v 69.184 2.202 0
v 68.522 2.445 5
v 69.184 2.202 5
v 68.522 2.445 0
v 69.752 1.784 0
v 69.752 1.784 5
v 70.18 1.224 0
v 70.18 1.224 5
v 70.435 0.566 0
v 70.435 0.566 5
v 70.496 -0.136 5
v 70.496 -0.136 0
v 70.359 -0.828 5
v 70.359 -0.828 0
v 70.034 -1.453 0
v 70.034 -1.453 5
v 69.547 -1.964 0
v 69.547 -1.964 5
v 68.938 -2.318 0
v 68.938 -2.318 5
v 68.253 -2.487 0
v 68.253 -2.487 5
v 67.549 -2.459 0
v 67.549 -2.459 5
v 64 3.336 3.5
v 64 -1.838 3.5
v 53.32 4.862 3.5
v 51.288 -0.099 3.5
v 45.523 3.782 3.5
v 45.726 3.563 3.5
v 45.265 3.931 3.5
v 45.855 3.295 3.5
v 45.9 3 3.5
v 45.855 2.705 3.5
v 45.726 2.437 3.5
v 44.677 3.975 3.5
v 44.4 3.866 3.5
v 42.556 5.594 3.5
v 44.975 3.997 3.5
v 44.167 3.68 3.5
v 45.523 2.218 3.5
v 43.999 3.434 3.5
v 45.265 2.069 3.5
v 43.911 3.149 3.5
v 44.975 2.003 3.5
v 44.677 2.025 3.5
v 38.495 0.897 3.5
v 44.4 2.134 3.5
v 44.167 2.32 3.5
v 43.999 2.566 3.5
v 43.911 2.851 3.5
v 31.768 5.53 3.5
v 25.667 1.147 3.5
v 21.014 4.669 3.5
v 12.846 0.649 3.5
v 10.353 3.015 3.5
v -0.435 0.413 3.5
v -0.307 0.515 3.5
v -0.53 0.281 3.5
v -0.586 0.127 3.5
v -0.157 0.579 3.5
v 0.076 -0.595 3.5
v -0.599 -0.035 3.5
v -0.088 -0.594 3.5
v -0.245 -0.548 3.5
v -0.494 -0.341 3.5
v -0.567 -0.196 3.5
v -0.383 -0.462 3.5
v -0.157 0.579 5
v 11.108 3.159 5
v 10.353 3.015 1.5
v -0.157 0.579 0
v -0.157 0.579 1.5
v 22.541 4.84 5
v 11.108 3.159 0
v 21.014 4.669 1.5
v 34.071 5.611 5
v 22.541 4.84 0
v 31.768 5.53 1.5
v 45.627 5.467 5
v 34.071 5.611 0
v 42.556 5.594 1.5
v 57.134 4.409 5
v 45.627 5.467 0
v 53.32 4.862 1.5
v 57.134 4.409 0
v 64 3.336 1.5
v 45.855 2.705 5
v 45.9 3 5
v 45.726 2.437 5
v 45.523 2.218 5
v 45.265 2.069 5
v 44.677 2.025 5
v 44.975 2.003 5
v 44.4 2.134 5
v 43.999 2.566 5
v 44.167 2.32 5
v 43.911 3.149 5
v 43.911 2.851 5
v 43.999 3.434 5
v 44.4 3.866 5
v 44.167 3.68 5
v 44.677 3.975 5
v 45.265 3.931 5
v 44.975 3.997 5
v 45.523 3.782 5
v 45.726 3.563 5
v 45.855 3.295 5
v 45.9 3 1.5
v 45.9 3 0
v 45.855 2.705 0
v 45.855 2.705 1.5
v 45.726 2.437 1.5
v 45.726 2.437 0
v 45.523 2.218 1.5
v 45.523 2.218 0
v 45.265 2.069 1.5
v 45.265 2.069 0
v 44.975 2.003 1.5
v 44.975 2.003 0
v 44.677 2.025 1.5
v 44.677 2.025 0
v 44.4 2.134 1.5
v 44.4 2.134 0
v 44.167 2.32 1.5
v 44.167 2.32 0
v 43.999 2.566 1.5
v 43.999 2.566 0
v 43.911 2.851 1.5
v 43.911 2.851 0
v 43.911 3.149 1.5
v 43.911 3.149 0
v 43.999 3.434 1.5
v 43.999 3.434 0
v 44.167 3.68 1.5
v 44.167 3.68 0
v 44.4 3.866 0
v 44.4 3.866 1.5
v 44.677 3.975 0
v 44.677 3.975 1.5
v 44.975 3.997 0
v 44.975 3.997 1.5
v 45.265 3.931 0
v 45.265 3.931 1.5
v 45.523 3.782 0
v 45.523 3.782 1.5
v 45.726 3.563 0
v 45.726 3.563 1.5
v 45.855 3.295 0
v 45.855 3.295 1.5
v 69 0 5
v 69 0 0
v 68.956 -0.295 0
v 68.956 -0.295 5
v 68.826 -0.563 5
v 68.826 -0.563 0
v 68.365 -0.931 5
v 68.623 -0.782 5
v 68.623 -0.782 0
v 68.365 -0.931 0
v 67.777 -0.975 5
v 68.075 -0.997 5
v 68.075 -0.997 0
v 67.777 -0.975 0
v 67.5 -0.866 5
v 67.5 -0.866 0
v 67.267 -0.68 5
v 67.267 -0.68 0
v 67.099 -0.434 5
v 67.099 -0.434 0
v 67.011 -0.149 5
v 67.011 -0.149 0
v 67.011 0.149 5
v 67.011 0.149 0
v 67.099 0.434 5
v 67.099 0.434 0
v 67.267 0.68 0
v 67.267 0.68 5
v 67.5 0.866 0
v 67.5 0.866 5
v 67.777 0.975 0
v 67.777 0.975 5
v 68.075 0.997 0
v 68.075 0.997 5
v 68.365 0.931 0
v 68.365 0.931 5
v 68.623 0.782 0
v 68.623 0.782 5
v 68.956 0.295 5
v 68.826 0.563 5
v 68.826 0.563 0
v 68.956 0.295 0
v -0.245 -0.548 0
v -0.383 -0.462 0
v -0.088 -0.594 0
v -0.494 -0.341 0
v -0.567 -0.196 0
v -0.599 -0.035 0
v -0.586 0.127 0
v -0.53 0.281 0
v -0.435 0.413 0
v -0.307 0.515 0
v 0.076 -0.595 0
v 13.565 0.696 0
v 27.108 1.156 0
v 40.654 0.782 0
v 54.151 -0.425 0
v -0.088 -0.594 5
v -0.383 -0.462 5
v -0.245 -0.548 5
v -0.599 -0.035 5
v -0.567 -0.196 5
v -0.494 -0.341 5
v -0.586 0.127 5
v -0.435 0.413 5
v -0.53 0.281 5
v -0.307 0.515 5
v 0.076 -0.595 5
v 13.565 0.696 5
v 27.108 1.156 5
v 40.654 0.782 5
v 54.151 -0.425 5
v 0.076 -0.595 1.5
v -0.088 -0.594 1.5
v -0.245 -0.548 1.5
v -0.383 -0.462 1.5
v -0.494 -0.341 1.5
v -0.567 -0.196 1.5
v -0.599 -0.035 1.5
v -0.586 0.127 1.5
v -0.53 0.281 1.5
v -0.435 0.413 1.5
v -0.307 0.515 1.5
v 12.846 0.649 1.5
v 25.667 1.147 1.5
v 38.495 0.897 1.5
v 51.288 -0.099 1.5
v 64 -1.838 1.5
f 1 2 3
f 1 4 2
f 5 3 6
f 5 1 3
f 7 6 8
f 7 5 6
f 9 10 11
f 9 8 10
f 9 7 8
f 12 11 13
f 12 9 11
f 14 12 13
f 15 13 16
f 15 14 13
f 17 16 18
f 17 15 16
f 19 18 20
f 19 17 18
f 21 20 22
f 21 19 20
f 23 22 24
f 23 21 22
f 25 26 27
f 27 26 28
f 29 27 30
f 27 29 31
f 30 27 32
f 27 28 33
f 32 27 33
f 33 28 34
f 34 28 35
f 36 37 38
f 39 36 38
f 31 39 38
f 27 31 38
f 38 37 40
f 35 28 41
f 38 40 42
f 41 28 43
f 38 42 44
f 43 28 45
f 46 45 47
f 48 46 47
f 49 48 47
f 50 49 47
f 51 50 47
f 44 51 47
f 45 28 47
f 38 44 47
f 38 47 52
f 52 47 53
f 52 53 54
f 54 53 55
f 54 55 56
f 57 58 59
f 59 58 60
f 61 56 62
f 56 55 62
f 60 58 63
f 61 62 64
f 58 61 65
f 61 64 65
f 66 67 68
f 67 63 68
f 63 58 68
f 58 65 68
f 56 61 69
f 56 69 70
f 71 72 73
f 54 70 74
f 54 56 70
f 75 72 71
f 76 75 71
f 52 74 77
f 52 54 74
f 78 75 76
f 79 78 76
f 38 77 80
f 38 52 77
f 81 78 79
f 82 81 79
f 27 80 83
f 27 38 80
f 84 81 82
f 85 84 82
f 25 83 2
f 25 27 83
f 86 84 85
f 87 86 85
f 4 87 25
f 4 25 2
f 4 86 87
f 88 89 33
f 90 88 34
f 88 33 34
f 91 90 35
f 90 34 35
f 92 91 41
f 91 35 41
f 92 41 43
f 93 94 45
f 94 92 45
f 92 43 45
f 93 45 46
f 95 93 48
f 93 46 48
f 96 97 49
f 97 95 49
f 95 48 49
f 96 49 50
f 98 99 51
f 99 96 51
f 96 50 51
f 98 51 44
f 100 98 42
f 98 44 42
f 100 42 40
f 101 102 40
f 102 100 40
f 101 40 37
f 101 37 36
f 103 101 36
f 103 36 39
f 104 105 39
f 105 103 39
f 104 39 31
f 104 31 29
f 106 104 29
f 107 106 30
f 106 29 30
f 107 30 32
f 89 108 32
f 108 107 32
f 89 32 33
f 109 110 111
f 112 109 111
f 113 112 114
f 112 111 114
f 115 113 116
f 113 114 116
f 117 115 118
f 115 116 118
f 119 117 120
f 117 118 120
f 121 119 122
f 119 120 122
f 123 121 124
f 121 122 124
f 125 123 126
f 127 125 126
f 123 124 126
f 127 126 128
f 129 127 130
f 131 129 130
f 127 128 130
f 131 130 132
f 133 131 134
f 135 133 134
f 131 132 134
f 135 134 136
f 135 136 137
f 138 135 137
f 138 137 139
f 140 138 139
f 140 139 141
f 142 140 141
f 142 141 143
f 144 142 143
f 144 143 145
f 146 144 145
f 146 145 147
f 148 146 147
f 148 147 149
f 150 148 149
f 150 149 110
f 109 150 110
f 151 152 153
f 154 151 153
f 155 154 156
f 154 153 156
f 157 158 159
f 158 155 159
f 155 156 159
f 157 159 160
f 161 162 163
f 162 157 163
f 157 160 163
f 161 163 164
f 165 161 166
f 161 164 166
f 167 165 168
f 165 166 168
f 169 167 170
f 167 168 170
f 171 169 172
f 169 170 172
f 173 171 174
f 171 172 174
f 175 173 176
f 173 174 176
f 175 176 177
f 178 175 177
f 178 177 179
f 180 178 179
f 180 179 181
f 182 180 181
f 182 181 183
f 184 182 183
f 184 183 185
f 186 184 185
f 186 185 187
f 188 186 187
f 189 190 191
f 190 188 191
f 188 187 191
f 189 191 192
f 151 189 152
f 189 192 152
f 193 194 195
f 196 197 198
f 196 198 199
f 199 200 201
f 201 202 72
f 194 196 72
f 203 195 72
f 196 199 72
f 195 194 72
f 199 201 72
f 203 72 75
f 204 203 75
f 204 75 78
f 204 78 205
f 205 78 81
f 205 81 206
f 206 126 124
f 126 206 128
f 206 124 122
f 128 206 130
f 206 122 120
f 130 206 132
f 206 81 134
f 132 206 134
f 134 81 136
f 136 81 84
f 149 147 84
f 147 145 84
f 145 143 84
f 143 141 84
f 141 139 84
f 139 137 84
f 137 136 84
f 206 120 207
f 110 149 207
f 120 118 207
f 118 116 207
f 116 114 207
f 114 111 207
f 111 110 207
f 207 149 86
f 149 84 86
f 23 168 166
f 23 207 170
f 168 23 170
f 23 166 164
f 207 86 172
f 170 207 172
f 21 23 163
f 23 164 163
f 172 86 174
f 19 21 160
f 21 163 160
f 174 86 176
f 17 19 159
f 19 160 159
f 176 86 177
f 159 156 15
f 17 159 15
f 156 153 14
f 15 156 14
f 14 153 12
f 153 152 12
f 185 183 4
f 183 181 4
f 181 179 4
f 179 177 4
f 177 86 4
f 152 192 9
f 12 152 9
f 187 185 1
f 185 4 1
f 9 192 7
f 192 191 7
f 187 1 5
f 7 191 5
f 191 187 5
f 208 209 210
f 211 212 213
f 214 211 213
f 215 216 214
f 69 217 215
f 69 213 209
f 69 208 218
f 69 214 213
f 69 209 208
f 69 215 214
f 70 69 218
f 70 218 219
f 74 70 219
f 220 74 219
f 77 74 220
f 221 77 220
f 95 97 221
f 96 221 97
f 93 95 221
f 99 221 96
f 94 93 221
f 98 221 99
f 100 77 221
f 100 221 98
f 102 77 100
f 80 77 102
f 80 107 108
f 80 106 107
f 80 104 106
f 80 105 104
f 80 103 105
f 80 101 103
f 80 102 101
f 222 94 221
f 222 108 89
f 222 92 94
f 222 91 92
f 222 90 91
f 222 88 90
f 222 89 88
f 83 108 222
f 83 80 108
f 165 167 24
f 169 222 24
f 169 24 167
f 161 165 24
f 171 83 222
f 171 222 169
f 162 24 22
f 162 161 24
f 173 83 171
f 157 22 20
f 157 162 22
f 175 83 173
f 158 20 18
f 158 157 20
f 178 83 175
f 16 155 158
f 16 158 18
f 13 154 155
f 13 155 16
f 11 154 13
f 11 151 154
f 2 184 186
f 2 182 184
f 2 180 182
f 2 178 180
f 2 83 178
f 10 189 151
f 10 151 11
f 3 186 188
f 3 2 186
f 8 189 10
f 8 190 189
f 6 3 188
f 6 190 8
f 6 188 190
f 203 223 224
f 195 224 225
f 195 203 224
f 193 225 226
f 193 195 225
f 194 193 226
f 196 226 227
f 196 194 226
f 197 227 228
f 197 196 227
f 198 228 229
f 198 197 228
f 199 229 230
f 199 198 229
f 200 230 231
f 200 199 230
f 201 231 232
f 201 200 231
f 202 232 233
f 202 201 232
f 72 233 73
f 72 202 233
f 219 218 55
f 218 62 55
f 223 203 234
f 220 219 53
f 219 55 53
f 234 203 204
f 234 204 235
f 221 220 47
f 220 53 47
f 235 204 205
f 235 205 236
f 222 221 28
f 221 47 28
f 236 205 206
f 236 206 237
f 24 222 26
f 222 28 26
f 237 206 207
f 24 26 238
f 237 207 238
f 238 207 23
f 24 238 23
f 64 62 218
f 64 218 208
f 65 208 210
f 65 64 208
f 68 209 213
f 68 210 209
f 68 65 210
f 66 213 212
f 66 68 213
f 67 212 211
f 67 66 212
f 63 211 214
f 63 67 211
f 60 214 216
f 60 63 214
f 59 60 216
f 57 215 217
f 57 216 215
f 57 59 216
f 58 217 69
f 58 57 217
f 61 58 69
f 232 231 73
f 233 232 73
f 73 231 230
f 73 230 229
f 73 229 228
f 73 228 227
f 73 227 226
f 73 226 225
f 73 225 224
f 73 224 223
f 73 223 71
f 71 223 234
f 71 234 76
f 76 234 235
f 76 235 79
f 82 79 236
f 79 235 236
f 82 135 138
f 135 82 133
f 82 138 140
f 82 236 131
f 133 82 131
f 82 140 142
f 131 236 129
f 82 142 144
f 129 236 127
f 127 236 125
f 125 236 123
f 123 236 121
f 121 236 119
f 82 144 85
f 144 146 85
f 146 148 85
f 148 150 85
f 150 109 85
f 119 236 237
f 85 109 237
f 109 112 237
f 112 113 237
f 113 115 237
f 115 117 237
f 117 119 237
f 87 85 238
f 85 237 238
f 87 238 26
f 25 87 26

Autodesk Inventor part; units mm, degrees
ref_plane "Work Plane1" through (0, 0, 0.75) normal (0, 0, 1) x (1, 0, 0)
ref_plane "YZ Plane" through (0, 0, 0) normal (1, 0, 0) x (0, 1, 0)
ref_plane "XZ Plane" through (0, 0, 0) normal (0, 1, 0) x (-1, 0, 0)
sketch "Sketch1" plane through (0, 0, 0) normal (0, 0, 1) x (1, 0, 0)
  circle A0 centre (68, 0) radius 1
  circle A1 centre (44.8999, 3) radius 1
  circle A2 centre (44.8999, 3) radius 2.5 construction
  arc A3 (-0.157, 0.5791) -> (0.0755, -0.5952) centre (0, 0) ccw
  arc A4 (68.5222, 2.4449) -> (-0.157, 0.5791) centre (38.035, -140.2958) ccw
  arc A5 (67.5488, -2.459) -> (0.0755, -0.5952) centre (27.8029, -219.0832) ccw
  arc A6 (67.5488, -2.459) -> (68.5222, 2.4449) centre (68, 0) ccw
  arc A7 (42.8188, 4.3853) -> (9.2918, 1.5821) centre (38.035, -140.2958) ccw
  arc A8 (42.6764, 1.8571) -> (9.2918, 1.5821) centre (27.8029, -219.0832) ccw
  arc A9 (42.8188, 4.3853) -> (42.6764, 1.8571) centre (44.8999, 3) ccw
  point P0 (44.8999, 6.5)
  dimension "d1" = 2
  dimension "d2" = 2
  dimension "d4" = 3
  dimension "d8" = 5
  dimension "d9" = 3.5
  dimension "d21" = 0.6
  dimension "d22" = 2.5
  dimension "d23" = 0
  dimension "d24" = 1.2
  dimension "d25" = 1.2
  dimension "d30" = 45
  dimension "d31" = 68
extrude "Extrusion1" add sketch "Sketch1" along normal blind 5 contours A4 A6 A5 A3 | A9 A8 A7
sketch "Sketch3" plane through (0, 0, 0) normal (0, 1, 0) x (-1, 0, 0)
  line L0 (4, 1.5) -> (-64, 1.5)
  line L1 (-64, 1.5) -> (-64, 3.5)
  line L2 (-64, 3.5) -> (4, 3.5)
  line L3 (4, 3.5) -> (4, 1.5)
  line L4 (-0.0755, 0) -> (-0.0755, 5) projected
  point P0 (0, 0)
  dimension "d34" = 1.5
  dimension "d35" = 4
  dimension "d36" = 2
  dimension "d37" = 68
extrude "Extrusion3" cut sketch "Sketch3" along normal through all both and the other way through all
properties part number "termite_beest_draft"
